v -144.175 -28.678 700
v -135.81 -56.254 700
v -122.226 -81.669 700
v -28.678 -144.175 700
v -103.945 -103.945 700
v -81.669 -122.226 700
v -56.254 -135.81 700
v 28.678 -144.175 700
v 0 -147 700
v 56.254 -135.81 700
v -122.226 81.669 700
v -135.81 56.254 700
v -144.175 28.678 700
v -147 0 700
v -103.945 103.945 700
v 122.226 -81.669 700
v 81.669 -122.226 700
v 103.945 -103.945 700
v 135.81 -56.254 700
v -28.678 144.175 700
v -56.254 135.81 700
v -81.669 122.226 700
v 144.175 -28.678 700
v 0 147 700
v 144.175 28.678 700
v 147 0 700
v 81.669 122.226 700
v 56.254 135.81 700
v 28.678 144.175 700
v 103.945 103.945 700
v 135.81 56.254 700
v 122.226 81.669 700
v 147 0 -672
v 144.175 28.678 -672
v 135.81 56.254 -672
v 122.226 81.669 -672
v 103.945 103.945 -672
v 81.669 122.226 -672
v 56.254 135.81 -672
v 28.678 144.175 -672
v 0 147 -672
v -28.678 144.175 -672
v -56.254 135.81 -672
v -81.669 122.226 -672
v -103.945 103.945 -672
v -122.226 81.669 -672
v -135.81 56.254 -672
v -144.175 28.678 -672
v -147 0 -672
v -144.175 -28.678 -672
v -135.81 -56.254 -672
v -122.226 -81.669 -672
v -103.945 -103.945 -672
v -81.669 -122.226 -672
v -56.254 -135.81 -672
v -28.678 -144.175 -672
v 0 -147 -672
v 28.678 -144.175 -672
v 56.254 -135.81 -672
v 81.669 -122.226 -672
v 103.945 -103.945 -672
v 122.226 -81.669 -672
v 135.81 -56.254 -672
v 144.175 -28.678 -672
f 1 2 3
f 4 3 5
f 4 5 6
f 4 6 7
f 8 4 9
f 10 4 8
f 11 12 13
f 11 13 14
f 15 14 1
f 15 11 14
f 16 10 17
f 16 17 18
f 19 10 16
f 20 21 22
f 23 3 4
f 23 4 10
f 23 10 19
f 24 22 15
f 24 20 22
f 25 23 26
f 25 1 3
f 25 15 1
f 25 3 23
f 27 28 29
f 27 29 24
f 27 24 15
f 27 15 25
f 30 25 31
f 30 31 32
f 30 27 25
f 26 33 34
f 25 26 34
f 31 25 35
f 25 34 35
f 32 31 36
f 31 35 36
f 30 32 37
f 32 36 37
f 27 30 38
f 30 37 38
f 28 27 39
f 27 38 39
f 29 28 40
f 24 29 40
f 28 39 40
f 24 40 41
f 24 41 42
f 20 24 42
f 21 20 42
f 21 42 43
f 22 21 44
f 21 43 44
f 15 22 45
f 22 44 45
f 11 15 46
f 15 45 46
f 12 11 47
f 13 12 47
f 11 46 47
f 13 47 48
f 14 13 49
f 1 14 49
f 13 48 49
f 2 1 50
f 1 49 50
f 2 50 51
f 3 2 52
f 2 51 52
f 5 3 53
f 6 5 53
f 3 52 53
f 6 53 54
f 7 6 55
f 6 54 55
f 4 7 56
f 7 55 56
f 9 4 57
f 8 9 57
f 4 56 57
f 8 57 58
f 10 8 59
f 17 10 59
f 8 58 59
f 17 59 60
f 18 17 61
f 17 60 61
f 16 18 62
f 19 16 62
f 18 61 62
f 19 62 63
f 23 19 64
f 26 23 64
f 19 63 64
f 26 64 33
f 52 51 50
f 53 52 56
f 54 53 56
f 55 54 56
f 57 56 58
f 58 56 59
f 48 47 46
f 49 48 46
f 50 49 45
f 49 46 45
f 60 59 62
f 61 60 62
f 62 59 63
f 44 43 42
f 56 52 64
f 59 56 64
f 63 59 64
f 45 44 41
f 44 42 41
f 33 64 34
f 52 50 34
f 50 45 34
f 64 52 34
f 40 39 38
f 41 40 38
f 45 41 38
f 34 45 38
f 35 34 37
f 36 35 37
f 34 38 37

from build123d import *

# Parameters (mm, degrees)
CROQUIS5_R              = 3
SALIENTE_EXTRUIR5_DEPTH = 28
ESCALA1_SCALE           = 7
ESCALA2_SCALE           = 7


with BuildPart() as part:
    # Croquis5 → Saliente-Extruir5 (new body)
    with BuildSketch(Plane.XY):
        Circle(CROQUIS5_R)
    extrude(amount=SALIENTE_EXTRUIR5_DEPTH)


with BuildPart() as part_1:
    # Escala1: scaled about (0, 0, 14)
    add(part.part.scale(ESCALA1_SCALE).moved(Location((0, 0, -84))))


with BuildPart() as part_2:
    # Escala2: scaled about (0, 0, 14)
    add(part_1.part.scale(ESCALA2_SCALE).moved(Location((0, 0, -84))))


solid = part_2.part
